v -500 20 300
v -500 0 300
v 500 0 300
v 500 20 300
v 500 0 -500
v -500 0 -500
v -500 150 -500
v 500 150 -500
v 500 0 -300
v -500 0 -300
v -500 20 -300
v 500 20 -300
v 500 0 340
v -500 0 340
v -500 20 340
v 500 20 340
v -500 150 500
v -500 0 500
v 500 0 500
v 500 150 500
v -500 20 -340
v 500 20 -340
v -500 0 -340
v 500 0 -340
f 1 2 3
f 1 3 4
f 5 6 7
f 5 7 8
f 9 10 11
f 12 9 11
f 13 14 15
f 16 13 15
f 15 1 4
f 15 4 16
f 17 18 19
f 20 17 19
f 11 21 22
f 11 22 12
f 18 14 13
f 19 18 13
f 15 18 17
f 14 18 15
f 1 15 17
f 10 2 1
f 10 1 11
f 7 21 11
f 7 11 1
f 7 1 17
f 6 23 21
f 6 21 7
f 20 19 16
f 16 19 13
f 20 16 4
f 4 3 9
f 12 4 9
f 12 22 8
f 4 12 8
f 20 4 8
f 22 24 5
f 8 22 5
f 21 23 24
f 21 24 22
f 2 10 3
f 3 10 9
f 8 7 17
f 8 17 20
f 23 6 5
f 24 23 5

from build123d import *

# Parameters (mm, degrees)
ESBO_O1_W                = 1000
ESBO_O1_H                = 1000
RESSALTO_EXTRUS_O1_DEPTH = 150
ESBO_O2_W                = 40
ESBO_O2_H                = 40
CORTE_EXTRUS_O1_DEPTH    = 1001


with BuildPart() as part:
    # Esboço1 → Ressalto-extrusão1 (new body)
    with BuildSketch(Plane(origin=(0, 0, 0), x_dir=(1, 0, 0), z_dir=(0, 1, 0))):
        Rectangle(ESBO_O1_W, ESBO_O1_H)
    extrude(amount=RESSALTO_EXTRUS_O1_DEPTH)

    # Esboço2 → Corte-extrusão1 (cut, through all)
    with BuildSketch(Plane.ZY.offset(500)):
        with Locations((320, 0)):
            Rectangle(ESBO_O2_W, ESBO_O2_H)
        with Locations((-320, 0)):
            Rectangle(ESBO_O2_W, ESBO_O2_H)
    extrude(amount=-CORTE_EXTRUS_O1_DEPTH, mode=Mode.SUBTRACT)


solid = part.part
